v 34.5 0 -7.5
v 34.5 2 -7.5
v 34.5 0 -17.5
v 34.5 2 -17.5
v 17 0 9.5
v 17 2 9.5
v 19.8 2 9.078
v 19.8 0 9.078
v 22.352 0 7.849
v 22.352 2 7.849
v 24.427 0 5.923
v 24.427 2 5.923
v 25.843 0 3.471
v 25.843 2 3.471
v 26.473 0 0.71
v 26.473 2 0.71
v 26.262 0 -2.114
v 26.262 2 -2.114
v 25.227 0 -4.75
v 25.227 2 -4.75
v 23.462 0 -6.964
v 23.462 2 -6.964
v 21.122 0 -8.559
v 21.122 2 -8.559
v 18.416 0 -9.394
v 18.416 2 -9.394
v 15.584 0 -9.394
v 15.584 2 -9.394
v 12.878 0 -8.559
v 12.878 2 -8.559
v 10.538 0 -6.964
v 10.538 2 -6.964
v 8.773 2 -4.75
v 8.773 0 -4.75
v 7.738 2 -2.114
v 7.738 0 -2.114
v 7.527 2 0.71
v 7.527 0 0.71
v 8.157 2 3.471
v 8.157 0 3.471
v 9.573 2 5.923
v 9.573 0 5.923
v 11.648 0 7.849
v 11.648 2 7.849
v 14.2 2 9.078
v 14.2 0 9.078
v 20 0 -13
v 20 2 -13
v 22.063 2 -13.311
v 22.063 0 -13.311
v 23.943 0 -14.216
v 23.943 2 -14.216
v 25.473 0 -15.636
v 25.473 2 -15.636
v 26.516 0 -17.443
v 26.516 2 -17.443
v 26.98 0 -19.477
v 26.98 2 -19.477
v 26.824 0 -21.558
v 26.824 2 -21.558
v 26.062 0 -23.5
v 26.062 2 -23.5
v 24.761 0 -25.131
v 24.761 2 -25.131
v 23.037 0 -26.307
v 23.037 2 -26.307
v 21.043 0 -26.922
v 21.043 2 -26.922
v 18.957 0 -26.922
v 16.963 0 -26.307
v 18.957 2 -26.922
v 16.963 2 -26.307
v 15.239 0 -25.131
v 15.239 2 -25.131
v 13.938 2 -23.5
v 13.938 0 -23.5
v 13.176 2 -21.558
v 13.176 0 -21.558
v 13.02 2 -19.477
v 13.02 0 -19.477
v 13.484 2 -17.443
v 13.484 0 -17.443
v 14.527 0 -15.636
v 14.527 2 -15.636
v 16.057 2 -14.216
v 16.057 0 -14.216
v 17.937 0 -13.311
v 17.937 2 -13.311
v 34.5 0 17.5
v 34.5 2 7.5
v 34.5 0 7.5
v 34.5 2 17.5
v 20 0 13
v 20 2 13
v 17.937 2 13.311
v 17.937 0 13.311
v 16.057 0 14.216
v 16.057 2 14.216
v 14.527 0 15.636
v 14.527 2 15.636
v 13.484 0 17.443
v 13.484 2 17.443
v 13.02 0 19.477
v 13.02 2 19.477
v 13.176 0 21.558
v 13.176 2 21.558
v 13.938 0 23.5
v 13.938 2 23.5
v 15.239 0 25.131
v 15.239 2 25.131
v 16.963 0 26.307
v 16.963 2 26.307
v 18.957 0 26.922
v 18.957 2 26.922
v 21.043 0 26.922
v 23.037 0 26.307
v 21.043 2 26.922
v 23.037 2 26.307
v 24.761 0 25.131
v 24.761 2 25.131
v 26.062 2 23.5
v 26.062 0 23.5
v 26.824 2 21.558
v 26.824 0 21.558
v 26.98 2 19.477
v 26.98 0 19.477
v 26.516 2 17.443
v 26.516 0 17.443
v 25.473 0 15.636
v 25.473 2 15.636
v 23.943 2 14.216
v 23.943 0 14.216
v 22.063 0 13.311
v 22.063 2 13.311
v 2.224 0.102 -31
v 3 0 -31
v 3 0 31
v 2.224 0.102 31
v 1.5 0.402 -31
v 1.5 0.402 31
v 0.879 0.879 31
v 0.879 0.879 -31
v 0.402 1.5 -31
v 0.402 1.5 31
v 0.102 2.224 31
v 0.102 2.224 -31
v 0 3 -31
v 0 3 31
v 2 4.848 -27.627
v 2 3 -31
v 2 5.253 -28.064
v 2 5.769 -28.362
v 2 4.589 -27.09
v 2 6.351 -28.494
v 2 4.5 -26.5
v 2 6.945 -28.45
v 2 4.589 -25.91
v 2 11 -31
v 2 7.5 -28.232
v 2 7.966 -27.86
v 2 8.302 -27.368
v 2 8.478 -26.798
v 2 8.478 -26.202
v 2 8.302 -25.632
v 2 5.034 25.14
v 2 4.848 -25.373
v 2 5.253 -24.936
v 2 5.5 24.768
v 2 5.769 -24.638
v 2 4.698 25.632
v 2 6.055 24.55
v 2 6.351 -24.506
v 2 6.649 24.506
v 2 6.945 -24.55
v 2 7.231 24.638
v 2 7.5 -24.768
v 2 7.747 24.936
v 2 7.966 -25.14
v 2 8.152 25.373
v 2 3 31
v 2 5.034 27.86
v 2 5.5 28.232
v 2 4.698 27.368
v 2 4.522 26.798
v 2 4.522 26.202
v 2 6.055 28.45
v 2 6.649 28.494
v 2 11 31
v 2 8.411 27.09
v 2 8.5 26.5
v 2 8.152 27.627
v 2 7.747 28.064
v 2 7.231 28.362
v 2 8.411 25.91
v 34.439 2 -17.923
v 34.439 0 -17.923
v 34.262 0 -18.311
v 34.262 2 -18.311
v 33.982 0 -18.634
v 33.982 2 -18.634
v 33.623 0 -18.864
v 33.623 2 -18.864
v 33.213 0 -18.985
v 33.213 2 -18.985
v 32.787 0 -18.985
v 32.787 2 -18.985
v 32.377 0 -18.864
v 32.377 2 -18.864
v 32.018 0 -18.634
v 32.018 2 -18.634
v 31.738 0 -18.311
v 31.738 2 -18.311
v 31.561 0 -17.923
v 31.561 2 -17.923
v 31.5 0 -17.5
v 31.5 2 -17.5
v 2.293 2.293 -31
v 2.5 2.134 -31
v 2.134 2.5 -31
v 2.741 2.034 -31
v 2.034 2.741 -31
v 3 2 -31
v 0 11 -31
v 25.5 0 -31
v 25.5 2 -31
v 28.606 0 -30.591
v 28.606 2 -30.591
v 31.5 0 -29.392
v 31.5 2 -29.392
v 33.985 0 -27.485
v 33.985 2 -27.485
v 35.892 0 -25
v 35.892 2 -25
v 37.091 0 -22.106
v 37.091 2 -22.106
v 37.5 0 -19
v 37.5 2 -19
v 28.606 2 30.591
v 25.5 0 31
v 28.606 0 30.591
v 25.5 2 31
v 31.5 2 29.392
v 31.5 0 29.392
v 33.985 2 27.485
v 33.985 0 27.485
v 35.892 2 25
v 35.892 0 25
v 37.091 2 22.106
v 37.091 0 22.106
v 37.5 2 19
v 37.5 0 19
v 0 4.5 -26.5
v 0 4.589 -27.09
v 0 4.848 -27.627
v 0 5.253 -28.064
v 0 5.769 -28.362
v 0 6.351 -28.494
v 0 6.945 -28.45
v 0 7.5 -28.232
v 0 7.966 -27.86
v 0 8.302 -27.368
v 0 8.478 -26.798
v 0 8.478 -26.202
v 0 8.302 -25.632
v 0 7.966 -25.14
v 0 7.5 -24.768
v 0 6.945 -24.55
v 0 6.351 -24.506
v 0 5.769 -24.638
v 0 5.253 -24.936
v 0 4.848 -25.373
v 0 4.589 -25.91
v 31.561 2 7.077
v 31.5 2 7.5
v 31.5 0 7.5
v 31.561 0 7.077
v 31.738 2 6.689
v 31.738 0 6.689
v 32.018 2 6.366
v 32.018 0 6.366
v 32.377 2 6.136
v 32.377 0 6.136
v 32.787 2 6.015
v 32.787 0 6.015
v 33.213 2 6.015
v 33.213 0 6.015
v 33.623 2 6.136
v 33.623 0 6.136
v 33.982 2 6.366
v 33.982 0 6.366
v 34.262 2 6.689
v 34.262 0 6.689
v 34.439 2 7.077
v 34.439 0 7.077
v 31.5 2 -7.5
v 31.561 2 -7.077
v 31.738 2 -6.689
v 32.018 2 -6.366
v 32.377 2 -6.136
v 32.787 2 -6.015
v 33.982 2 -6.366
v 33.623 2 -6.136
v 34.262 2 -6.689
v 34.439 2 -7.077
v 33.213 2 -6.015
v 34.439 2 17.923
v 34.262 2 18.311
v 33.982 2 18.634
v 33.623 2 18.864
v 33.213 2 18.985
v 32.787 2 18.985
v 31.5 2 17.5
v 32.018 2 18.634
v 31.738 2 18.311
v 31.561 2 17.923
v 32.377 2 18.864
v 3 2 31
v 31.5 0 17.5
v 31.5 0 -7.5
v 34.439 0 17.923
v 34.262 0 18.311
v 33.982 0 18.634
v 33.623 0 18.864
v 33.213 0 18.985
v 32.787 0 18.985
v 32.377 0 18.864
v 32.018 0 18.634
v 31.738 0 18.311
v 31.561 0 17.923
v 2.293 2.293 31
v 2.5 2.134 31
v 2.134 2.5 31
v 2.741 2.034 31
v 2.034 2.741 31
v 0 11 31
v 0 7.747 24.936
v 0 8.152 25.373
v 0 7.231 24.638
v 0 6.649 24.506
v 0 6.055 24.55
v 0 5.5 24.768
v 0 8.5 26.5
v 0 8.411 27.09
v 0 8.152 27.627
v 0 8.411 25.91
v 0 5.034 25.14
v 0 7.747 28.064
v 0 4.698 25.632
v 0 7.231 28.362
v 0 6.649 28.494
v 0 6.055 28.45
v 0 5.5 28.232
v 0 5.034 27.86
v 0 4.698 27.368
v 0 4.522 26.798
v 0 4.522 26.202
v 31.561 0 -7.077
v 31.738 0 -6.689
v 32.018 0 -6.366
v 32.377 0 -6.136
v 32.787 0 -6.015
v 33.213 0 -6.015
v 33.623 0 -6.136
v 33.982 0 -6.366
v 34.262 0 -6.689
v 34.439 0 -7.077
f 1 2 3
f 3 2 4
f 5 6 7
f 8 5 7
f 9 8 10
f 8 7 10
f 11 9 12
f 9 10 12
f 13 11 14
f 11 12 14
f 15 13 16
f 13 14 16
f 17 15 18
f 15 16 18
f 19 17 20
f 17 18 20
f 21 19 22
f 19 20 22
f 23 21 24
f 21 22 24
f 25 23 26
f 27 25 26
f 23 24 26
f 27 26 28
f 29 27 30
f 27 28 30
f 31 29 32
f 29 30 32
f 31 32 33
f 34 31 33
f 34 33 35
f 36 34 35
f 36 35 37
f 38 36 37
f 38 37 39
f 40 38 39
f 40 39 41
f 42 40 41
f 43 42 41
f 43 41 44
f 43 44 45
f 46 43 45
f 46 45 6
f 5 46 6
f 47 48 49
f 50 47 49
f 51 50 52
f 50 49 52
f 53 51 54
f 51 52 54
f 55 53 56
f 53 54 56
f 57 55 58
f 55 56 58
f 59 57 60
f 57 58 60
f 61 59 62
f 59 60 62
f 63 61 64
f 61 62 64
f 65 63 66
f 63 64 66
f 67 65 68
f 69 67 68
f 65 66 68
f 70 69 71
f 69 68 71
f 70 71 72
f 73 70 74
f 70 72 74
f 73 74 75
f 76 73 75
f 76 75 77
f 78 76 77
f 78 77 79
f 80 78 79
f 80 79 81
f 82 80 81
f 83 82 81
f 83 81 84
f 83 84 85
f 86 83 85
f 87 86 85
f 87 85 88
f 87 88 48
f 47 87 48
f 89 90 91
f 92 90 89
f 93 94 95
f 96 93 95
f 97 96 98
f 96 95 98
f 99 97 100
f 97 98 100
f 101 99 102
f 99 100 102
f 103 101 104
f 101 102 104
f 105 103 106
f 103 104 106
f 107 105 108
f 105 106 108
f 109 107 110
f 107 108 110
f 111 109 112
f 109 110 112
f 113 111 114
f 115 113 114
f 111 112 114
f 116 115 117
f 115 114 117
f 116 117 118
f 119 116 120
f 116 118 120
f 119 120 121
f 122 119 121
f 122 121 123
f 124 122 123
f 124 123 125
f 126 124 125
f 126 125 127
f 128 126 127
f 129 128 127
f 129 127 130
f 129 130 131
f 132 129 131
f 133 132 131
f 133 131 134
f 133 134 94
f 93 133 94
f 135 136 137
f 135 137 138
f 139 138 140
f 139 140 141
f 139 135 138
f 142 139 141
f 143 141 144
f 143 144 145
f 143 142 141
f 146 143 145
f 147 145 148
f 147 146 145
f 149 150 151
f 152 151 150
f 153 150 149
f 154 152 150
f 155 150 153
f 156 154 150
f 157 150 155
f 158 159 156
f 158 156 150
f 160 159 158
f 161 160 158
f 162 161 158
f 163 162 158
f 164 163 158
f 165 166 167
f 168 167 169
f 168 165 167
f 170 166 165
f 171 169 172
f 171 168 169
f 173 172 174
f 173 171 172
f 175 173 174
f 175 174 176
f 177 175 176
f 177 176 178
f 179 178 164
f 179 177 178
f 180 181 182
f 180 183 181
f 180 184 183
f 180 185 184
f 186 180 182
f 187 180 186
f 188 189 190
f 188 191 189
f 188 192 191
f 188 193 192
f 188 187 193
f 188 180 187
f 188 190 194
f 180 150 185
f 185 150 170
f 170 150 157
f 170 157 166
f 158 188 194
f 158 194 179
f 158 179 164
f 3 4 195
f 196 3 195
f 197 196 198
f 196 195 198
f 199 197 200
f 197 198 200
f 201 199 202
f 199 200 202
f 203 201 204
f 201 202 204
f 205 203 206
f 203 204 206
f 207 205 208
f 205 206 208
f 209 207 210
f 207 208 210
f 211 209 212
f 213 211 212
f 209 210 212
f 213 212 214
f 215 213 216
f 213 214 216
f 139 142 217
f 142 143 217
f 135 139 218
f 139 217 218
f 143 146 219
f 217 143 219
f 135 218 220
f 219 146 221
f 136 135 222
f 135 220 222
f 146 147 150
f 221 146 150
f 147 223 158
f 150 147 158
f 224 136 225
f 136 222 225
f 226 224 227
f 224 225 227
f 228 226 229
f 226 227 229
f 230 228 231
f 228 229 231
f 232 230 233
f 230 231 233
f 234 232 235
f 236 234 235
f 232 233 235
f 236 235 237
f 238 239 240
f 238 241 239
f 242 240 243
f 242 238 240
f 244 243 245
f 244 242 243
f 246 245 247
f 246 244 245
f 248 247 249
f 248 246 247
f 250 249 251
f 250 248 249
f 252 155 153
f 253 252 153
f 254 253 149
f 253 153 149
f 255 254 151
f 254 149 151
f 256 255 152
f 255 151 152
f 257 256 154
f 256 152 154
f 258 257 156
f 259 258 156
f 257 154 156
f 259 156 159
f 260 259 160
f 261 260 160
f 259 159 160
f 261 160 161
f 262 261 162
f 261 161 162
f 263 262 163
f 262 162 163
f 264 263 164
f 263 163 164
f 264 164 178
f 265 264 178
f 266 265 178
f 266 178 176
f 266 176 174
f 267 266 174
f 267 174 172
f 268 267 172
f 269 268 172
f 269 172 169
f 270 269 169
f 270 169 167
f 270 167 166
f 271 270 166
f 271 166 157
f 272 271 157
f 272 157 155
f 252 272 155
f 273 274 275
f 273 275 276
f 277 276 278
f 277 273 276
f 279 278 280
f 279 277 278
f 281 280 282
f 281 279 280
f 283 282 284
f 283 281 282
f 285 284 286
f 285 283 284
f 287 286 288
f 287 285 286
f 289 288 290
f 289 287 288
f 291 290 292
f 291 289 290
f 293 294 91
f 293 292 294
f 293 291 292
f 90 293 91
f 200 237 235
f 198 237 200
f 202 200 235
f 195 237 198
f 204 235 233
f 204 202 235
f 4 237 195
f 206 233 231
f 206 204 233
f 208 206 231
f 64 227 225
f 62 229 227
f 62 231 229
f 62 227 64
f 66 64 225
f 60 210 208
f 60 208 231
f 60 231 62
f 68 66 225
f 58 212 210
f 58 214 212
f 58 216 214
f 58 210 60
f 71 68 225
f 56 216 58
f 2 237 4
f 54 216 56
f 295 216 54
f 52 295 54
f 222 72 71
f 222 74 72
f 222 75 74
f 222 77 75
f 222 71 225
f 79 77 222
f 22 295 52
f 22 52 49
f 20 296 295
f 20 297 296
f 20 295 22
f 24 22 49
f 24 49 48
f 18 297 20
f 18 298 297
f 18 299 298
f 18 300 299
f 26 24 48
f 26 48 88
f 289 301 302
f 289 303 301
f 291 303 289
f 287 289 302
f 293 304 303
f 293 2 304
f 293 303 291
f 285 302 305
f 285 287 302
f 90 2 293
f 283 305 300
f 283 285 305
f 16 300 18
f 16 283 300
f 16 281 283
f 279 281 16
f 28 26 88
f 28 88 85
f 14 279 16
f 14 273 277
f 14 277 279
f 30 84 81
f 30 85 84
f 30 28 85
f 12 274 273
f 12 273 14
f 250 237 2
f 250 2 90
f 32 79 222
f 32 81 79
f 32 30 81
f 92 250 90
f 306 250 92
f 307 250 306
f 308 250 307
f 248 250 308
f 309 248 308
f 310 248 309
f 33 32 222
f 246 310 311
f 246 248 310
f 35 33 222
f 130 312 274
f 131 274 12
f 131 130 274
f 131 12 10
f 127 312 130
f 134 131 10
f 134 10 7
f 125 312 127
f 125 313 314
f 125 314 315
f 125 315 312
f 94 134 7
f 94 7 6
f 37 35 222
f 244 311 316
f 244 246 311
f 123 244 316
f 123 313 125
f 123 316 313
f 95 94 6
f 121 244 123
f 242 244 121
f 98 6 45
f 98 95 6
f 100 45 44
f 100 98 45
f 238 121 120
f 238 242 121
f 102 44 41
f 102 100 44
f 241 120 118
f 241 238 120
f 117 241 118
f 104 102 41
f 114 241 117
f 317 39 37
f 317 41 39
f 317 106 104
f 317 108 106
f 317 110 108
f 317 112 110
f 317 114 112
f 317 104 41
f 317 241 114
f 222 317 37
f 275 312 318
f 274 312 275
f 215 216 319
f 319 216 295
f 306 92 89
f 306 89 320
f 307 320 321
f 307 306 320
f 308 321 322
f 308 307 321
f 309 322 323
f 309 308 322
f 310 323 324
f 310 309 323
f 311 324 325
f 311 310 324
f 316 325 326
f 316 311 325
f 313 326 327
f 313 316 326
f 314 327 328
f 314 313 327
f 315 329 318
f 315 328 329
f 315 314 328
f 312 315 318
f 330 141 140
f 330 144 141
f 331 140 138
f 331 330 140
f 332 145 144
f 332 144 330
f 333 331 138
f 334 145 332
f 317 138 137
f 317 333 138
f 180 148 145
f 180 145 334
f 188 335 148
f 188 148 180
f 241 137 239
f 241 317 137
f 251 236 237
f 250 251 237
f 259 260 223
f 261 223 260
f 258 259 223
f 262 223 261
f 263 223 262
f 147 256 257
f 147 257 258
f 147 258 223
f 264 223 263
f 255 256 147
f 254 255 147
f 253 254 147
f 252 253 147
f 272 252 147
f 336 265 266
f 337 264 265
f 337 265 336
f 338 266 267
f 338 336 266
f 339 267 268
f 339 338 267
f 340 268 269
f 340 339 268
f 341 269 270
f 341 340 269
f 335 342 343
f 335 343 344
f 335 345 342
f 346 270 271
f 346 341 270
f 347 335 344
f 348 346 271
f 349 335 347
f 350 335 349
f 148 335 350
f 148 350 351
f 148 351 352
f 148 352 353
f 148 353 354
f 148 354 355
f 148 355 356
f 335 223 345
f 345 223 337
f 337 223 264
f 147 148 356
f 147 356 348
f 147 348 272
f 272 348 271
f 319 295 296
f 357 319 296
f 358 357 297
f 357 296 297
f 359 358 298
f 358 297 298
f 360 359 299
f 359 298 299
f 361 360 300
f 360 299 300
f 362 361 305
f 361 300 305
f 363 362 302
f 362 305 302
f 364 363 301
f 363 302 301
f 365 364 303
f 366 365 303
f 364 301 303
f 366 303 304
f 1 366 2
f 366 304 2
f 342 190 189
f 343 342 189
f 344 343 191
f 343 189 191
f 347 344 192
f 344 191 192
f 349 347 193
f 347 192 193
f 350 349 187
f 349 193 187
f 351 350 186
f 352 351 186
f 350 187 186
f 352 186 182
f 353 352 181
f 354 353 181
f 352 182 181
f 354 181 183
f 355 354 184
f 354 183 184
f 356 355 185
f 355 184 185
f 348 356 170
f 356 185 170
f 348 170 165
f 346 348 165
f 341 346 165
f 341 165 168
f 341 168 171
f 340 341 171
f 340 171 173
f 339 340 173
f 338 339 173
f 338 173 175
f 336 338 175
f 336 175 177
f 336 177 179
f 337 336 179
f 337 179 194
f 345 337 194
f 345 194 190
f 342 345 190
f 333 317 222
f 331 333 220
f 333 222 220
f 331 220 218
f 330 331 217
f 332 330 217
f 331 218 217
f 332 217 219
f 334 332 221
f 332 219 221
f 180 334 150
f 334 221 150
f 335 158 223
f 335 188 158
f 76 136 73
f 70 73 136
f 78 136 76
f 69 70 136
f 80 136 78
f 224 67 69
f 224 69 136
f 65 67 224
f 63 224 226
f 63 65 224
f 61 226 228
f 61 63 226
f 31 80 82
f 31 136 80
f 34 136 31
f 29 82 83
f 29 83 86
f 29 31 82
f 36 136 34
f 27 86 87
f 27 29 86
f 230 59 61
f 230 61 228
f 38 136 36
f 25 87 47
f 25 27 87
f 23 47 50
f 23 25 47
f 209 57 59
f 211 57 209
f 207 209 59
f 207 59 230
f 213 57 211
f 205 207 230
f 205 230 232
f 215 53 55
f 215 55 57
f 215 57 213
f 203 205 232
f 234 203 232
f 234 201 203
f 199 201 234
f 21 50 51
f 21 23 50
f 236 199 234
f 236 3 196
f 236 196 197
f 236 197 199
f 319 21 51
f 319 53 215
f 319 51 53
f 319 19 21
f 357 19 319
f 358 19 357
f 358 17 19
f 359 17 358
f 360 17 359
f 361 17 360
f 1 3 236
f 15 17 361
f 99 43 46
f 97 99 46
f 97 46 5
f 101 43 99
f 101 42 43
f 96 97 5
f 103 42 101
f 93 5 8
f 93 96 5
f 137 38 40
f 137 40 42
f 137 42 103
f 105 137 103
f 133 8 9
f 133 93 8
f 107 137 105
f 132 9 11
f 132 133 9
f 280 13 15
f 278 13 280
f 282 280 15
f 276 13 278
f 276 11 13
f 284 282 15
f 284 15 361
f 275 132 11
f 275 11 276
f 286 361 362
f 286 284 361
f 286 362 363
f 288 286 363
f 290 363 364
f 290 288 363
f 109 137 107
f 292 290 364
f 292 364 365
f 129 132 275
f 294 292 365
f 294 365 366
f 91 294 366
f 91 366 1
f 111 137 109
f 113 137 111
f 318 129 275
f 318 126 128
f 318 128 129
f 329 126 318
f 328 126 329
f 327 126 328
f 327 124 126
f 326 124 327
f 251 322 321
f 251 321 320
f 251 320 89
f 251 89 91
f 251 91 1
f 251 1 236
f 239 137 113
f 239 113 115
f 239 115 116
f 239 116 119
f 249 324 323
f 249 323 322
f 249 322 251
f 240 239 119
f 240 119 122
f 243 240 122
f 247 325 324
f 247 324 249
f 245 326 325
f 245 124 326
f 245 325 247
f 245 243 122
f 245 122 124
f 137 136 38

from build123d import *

# Parameters (mm, degrees)
EXTRUDE_1_DEPTH       = 31
SKETCH_2_R            = 2
CUT_EXTRUDE_1_DEPTH   = 49.396797415
SKETCH_3_R            = 9.5
SKETCH_3_R_2          = 7
CUT_EXTRUDE_2_DEPTH   = 50.479793856
FILLET_1_R            = 12
SHEET_START           = -31
SHEET_METAL_1_DEPTH   = 62
SHEET_METAL_1_2_DEPTH = 62


# Read off the part's stored shape, not the designer's step: 转换实体1
with BuildPart() as part:
    # Sketch 1 → 拉伸-薄壁1 (new, symmetric)
    with BuildSketch(Plane.XY):
        Polygon((0, 11), (0, 0), (37.5, 0), (37.5, 2), (2, 2), (2, 11), align=None)
    extrude(amount=EXTRUDE_1_DEPTH, both=True)

    # Sketch 2 → 切除-拉伸1 (cut, through all)
    with BuildSketch(Plane(origin=(2, 0, 0), x_dir=(0, 0, -1), z_dir=(1, 0, 0))):
        with Locations(Location((-26.5, 6.5, 0), (0, 0, 90))):
            Circle(SKETCH_2_R)
        with Locations(Location((26.5, 6.5, 0), (0, 0, 270))):
            Circle(SKETCH_2_R)
    extrude(amount=-CUT_EXTRUDE_1_DEPTH, mode=Mode.SUBTRACT)

    # 草图3 → 切除-拉伸2 (cut, through all)
    with BuildSketch(Plane(origin=(0, 2, 0), x_dir=(1, 0, 0), z_dir=(0, 1, 0))):
        with Locations(Location((17, 0, 0), (0, 0, 270))):
            Circle(SKETCH_3_R)
        with Locations(Location((20, 20, 0), (0, 0, 270))):
            Circle(SKETCH_3_R_2)
        with Locations(Location((20, -20, 0), (0, 0, 90))):
            Circle(SKETCH_3_R_2)
        with BuildLine():
            Line((34.5, -7.5), (34.5, -17.5))
            ThreePointArc((34.5, -17.5), (33, -19), (31.5, -17.5))
            Line((31.5, -17.5), (31.5, -7.5))
            ThreePointArc((31.5, -7.5), (33, -6), (34.5, -7.5))
        make_face()
        with BuildLine():
            Line((34.5, 7.5), (34.5, 17.5))
            ThreePointArc((34.5, 17.5), (33, 19), (31.5, 17.5))
            Line((31.5, 17.5), (31.5, 7.5))
            ThreePointArc((31.5, 7.5), (33, 6), (34.5, 7.5))
        make_face()
    extrude(amount=-CUT_EXTRUDE_2_DEPTH, mode=Mode.SUBTRACT)

    # 圆角1
    fillet_1_edges = [part.edges().sort_by_distance(p)[0] for p in [
        (37.5, 1, -31),
        (37.5, 1, 31),
    ]]
    fillet(fillet_1_edges, radius=FILLET_1_R)

    # Sheet Metal 1 outline → Sheet Metal 1 (cut)
    with BuildSketch(Plane.XY.offset(SHEET_START)):
        with BuildLine():
            ThreePointArc((3, 0), (0.878679656, 0.878679656), (0, 3))
            Line((0, 3), (0, 0))
            Line((0, 0), (3, 0))
        make_face()
    extrude(amount=SHEET_METAL_1_DEPTH, mode=Mode.SUBTRACT)

    # Sheet Metal 1 2 outline → Sheet Metal 1 2 (add)
    with BuildSketch(Plane.XY.offset(SHEET_START)):
        with BuildLine():
            ThreePointArc((3, 2), (2.292893219, 2.292893219), (2, 3))
            Line((2, 3), (2, 2))
            Line((2, 2), (3, 2))
        make_face()
    extrude(amount=SHEET_METAL_1_2_DEPTH)


solid = part.part
